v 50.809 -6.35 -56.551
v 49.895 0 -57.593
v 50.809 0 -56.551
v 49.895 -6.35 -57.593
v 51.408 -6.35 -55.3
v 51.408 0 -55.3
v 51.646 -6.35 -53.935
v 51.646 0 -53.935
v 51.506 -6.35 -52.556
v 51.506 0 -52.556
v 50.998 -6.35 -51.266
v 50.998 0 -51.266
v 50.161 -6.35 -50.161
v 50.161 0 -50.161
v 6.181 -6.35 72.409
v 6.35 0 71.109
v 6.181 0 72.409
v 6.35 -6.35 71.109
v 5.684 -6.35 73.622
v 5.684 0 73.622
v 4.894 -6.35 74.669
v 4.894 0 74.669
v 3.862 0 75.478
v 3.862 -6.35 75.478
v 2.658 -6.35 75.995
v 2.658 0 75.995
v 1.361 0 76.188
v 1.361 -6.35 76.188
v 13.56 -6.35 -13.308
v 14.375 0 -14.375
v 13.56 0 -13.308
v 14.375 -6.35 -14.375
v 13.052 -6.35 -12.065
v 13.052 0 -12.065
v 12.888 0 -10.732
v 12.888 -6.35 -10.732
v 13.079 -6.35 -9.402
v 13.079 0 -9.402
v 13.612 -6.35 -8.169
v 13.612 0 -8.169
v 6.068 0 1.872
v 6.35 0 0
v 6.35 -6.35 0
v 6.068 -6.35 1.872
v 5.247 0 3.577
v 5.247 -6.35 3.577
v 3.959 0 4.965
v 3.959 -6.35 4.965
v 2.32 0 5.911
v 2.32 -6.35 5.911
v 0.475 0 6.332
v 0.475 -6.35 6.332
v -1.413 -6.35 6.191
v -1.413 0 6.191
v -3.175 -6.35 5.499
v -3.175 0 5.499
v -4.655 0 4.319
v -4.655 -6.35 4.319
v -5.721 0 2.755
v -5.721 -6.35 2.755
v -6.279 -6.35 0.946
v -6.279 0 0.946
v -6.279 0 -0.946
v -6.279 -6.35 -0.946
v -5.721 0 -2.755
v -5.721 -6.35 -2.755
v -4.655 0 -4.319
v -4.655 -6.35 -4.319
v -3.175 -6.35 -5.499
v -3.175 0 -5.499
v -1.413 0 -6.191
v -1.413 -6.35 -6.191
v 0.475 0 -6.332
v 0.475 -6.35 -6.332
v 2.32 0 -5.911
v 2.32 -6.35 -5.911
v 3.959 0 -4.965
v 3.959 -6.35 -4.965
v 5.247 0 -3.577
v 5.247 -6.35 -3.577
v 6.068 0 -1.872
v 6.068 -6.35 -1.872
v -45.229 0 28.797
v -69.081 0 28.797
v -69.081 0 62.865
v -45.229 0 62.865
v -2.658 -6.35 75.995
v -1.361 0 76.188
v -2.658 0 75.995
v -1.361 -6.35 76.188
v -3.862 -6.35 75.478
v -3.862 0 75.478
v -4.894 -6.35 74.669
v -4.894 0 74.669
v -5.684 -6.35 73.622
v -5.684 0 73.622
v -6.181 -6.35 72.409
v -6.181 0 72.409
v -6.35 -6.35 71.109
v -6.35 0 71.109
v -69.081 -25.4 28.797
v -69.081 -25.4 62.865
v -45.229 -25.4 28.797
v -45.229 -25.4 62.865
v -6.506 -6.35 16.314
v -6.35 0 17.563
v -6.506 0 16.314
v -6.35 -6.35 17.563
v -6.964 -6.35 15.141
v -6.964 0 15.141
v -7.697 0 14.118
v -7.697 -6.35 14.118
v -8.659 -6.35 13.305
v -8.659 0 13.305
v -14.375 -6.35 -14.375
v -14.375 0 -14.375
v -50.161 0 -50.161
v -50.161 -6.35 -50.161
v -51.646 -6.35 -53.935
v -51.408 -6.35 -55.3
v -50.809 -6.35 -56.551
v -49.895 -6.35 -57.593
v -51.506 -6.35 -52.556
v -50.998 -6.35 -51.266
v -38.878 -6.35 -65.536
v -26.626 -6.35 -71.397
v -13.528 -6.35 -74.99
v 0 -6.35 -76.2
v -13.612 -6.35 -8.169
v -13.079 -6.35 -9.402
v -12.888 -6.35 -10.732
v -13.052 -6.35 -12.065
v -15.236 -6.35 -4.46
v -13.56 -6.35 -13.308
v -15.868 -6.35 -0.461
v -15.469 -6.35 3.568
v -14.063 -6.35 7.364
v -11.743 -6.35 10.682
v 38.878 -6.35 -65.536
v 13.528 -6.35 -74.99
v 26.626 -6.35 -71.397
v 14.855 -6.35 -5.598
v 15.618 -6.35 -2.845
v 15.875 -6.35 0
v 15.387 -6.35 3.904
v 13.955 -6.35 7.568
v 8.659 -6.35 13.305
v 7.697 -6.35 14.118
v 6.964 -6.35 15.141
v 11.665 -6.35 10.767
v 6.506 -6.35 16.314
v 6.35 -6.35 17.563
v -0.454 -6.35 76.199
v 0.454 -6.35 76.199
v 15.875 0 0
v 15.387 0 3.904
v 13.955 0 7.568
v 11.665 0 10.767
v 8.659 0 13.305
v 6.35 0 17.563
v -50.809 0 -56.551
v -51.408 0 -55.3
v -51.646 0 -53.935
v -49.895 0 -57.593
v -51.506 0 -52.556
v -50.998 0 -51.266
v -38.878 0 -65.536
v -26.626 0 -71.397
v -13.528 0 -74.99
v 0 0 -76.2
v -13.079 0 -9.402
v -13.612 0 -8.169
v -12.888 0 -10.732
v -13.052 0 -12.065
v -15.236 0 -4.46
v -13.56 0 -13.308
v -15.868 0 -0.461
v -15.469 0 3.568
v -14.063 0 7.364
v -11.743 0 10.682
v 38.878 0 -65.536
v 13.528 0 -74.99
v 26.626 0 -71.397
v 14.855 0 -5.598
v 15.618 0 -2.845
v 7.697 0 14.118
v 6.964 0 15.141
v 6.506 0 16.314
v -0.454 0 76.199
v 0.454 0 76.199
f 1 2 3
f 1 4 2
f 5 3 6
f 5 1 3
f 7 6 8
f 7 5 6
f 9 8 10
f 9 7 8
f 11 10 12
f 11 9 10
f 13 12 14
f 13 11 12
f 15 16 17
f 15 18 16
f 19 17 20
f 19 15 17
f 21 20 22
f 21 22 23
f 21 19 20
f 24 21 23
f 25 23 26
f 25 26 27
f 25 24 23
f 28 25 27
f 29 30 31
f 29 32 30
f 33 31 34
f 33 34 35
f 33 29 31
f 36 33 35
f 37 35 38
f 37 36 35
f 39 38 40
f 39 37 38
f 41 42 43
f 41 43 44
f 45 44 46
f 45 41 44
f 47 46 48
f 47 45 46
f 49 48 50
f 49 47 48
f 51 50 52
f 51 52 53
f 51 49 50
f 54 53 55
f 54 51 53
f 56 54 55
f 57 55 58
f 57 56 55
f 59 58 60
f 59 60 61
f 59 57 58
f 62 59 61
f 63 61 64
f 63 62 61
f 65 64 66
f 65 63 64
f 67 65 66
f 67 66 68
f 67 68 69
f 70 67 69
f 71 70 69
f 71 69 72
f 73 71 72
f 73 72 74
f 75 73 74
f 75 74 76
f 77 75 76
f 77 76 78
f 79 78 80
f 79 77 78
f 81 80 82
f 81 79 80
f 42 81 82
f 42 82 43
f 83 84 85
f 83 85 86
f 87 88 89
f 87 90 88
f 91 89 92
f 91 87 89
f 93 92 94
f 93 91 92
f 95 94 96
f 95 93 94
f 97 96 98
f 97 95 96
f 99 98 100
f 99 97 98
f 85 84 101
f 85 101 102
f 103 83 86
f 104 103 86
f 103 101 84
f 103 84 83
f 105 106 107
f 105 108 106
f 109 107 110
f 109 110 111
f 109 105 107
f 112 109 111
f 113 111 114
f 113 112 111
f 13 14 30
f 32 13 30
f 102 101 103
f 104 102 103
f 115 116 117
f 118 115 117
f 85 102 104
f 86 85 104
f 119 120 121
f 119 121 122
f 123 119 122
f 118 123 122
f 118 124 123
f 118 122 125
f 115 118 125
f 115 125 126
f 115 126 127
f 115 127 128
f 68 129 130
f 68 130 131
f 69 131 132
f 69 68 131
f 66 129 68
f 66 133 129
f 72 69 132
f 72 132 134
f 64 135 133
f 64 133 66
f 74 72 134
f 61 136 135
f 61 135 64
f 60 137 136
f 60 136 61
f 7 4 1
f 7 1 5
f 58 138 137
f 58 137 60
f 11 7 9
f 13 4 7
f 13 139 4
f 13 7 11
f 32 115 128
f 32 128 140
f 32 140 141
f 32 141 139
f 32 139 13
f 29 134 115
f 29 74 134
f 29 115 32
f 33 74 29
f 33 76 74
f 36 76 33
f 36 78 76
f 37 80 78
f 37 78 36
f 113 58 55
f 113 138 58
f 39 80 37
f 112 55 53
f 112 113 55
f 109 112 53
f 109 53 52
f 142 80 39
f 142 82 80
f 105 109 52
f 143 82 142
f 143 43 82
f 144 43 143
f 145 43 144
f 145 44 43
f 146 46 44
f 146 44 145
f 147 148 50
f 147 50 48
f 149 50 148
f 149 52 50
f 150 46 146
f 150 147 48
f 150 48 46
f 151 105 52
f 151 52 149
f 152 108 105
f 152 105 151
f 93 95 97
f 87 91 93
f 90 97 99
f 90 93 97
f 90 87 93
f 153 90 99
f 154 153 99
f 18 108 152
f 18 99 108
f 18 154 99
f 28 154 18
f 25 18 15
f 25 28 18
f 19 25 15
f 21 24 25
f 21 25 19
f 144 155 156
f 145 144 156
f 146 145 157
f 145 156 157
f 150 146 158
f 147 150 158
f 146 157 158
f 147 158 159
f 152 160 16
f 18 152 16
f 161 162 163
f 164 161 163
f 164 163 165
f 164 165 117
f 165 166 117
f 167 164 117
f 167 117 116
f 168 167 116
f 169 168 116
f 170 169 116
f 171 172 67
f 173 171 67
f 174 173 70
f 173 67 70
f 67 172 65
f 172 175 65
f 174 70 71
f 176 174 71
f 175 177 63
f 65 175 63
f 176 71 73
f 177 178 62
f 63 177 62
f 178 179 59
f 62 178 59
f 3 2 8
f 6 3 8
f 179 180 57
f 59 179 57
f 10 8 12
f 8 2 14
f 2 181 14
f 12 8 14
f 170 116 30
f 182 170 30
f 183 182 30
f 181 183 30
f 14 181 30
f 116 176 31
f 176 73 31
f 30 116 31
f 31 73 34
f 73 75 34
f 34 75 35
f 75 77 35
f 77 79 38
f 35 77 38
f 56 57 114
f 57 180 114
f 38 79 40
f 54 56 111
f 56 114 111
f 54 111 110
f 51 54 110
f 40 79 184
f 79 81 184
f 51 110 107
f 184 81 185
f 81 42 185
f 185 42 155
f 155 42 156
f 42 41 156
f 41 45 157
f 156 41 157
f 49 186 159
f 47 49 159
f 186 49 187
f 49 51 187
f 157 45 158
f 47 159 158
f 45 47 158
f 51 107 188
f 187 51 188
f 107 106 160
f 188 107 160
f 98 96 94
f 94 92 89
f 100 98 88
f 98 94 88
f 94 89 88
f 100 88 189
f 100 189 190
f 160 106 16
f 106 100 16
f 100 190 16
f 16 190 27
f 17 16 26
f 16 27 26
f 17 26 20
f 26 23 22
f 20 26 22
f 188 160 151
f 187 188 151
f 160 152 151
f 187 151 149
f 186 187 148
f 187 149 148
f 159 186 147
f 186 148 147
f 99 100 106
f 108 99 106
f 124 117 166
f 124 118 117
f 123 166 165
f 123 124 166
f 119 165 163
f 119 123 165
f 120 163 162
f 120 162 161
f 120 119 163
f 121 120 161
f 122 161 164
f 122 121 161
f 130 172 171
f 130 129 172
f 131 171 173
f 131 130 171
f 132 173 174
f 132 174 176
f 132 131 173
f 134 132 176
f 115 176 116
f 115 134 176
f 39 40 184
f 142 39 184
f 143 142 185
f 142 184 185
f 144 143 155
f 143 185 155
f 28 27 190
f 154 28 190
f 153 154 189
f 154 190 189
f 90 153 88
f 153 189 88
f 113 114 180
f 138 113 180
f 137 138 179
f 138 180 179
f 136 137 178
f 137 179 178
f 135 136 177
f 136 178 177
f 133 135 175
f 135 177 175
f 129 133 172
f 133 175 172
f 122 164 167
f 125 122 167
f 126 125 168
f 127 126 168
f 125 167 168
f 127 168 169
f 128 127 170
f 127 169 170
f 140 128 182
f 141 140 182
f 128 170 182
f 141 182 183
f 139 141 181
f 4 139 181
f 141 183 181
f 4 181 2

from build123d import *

# Parameters (mm, degrees)
F0_R     = 6.35
F1_DEPTH = 6.35
F2_R     = 5.08
F3_W     = 23.8519832492
F3_H     = 34.067934379
F4_DEPTH = 25.4


with BuildPart() as f1:
    # F0 (on Front) → F1 (new body)
    with BuildSketch(Plane.XZ):
        with BuildLine():
            ThreePointArc((-6.35, 14.5496778315), (0, 15.875), (6.35, 14.5496778315))
            Line((6.35, 14.5496778315), (6.35, 66.3719302492))
            ThreePointArc((6.35, 66.3719302492), (0, 66.675), (-6.35, 66.3719302492))
            Line((-6.35, 66.3719302492), (-6.35, 14.5496778315))
        make_face()
        with BuildLine():
            ThreePointArc((-6.35, 66.3719302492), (0, 66.675), (6.35, 66.3719302492))
            Line((6.35, 66.3719302492), (6.35, 75.9349557187))
            ThreePointArc((6.35, 75.9349557187), (0, 76.2), (-6.35, 75.9349557187))
            Line((-6.35, 75.9349557187), (-6.35, 66.3719302492))
        make_face()
        with BuildLine():
            ThreePointArc((11.2253201513, -11.2253201513), (14.6665875786, -6.0750994888), (15.875, 0))
            ThreePointArc((15.875, 0), (13.2819779212, 8.6950956004), (6.35, 14.5496778315))
            ThreePointArc((6.35, 14.5496778315), (0, 15.875), (-6.35, 14.5496778315))
            ThreePointArc((-6.35, 14.5496778315), (-15.5984165818, 2.9504279589), (-11.2253201513, -11.2253201513))
            ThreePointArc((-11.2253201513, -11.2253201513), (0, -15.875), (11.2253201513, -11.2253201513))
        make_face()
        Circle(F0_R, mode=Mode.SUBTRACT)
        with BuildLine():
            Line((53.8815367264, -53.8815367264), (47.1463446356, -47.1463446356))
            ThreePointArc((47.1463446356, -47.1463446356), (0, -66.675), (-47.1463446356, -47.1463446356))
            Line((-47.1463446356, -47.1463446356), (-53.8815367264, -53.8815367264))
            ThreePointArc((-53.8815367264, -53.8815367264), (0, -76.2), (53.8815367264, -53.8815367264))
        make_face()
        with BuildLine():
            Line((47.1463446356, -47.1463446356), (11.2253201513, -11.2253201513))
            ThreePointArc((11.2253201513, -11.2253201513), (0, -15.875), (-11.2253201513, -11.2253201513))
            Line((-11.2253201513, -11.2253201513), (-47.1463446356, -47.1463446356))
            ThreePointArc((-47.1463446356, -47.1463446356), (0, -66.675), (47.1463446356, -47.1463446356))
        make_face()
    extrude(amount=F1_DEPTH)

    # F2
    f2_edges = [f1.edges().sort_by_distance(p)[0] for p in [
        (6.35, -3.175, 75.934956),
        (-6.35, -3.175, 75.934956),
        (-6.35, -3.175, 14.549678),
        (-11.22532, -3.175, -11.22532),
        (6.35, -3.175, 14.549678),
        (11.22532, -3.175, -11.22532),
        (53.881537, -3.175, -53.881537),
        (-53.881537, -3.175, -53.881537),
    ]]
    fillet(f2_edges, radius=F2_R)


with BuildPart() as f4:
    # F3 (on Front) → F4 (new body)
    with BuildSketch(Plane.XZ):
        with Locations((-57.1547560394, 45.8310293034)):
            Rectangle(F3_W, F3_H)
    extrude(amount=F4_DEPTH)


solid = Compound([f1.part, f4.part])
